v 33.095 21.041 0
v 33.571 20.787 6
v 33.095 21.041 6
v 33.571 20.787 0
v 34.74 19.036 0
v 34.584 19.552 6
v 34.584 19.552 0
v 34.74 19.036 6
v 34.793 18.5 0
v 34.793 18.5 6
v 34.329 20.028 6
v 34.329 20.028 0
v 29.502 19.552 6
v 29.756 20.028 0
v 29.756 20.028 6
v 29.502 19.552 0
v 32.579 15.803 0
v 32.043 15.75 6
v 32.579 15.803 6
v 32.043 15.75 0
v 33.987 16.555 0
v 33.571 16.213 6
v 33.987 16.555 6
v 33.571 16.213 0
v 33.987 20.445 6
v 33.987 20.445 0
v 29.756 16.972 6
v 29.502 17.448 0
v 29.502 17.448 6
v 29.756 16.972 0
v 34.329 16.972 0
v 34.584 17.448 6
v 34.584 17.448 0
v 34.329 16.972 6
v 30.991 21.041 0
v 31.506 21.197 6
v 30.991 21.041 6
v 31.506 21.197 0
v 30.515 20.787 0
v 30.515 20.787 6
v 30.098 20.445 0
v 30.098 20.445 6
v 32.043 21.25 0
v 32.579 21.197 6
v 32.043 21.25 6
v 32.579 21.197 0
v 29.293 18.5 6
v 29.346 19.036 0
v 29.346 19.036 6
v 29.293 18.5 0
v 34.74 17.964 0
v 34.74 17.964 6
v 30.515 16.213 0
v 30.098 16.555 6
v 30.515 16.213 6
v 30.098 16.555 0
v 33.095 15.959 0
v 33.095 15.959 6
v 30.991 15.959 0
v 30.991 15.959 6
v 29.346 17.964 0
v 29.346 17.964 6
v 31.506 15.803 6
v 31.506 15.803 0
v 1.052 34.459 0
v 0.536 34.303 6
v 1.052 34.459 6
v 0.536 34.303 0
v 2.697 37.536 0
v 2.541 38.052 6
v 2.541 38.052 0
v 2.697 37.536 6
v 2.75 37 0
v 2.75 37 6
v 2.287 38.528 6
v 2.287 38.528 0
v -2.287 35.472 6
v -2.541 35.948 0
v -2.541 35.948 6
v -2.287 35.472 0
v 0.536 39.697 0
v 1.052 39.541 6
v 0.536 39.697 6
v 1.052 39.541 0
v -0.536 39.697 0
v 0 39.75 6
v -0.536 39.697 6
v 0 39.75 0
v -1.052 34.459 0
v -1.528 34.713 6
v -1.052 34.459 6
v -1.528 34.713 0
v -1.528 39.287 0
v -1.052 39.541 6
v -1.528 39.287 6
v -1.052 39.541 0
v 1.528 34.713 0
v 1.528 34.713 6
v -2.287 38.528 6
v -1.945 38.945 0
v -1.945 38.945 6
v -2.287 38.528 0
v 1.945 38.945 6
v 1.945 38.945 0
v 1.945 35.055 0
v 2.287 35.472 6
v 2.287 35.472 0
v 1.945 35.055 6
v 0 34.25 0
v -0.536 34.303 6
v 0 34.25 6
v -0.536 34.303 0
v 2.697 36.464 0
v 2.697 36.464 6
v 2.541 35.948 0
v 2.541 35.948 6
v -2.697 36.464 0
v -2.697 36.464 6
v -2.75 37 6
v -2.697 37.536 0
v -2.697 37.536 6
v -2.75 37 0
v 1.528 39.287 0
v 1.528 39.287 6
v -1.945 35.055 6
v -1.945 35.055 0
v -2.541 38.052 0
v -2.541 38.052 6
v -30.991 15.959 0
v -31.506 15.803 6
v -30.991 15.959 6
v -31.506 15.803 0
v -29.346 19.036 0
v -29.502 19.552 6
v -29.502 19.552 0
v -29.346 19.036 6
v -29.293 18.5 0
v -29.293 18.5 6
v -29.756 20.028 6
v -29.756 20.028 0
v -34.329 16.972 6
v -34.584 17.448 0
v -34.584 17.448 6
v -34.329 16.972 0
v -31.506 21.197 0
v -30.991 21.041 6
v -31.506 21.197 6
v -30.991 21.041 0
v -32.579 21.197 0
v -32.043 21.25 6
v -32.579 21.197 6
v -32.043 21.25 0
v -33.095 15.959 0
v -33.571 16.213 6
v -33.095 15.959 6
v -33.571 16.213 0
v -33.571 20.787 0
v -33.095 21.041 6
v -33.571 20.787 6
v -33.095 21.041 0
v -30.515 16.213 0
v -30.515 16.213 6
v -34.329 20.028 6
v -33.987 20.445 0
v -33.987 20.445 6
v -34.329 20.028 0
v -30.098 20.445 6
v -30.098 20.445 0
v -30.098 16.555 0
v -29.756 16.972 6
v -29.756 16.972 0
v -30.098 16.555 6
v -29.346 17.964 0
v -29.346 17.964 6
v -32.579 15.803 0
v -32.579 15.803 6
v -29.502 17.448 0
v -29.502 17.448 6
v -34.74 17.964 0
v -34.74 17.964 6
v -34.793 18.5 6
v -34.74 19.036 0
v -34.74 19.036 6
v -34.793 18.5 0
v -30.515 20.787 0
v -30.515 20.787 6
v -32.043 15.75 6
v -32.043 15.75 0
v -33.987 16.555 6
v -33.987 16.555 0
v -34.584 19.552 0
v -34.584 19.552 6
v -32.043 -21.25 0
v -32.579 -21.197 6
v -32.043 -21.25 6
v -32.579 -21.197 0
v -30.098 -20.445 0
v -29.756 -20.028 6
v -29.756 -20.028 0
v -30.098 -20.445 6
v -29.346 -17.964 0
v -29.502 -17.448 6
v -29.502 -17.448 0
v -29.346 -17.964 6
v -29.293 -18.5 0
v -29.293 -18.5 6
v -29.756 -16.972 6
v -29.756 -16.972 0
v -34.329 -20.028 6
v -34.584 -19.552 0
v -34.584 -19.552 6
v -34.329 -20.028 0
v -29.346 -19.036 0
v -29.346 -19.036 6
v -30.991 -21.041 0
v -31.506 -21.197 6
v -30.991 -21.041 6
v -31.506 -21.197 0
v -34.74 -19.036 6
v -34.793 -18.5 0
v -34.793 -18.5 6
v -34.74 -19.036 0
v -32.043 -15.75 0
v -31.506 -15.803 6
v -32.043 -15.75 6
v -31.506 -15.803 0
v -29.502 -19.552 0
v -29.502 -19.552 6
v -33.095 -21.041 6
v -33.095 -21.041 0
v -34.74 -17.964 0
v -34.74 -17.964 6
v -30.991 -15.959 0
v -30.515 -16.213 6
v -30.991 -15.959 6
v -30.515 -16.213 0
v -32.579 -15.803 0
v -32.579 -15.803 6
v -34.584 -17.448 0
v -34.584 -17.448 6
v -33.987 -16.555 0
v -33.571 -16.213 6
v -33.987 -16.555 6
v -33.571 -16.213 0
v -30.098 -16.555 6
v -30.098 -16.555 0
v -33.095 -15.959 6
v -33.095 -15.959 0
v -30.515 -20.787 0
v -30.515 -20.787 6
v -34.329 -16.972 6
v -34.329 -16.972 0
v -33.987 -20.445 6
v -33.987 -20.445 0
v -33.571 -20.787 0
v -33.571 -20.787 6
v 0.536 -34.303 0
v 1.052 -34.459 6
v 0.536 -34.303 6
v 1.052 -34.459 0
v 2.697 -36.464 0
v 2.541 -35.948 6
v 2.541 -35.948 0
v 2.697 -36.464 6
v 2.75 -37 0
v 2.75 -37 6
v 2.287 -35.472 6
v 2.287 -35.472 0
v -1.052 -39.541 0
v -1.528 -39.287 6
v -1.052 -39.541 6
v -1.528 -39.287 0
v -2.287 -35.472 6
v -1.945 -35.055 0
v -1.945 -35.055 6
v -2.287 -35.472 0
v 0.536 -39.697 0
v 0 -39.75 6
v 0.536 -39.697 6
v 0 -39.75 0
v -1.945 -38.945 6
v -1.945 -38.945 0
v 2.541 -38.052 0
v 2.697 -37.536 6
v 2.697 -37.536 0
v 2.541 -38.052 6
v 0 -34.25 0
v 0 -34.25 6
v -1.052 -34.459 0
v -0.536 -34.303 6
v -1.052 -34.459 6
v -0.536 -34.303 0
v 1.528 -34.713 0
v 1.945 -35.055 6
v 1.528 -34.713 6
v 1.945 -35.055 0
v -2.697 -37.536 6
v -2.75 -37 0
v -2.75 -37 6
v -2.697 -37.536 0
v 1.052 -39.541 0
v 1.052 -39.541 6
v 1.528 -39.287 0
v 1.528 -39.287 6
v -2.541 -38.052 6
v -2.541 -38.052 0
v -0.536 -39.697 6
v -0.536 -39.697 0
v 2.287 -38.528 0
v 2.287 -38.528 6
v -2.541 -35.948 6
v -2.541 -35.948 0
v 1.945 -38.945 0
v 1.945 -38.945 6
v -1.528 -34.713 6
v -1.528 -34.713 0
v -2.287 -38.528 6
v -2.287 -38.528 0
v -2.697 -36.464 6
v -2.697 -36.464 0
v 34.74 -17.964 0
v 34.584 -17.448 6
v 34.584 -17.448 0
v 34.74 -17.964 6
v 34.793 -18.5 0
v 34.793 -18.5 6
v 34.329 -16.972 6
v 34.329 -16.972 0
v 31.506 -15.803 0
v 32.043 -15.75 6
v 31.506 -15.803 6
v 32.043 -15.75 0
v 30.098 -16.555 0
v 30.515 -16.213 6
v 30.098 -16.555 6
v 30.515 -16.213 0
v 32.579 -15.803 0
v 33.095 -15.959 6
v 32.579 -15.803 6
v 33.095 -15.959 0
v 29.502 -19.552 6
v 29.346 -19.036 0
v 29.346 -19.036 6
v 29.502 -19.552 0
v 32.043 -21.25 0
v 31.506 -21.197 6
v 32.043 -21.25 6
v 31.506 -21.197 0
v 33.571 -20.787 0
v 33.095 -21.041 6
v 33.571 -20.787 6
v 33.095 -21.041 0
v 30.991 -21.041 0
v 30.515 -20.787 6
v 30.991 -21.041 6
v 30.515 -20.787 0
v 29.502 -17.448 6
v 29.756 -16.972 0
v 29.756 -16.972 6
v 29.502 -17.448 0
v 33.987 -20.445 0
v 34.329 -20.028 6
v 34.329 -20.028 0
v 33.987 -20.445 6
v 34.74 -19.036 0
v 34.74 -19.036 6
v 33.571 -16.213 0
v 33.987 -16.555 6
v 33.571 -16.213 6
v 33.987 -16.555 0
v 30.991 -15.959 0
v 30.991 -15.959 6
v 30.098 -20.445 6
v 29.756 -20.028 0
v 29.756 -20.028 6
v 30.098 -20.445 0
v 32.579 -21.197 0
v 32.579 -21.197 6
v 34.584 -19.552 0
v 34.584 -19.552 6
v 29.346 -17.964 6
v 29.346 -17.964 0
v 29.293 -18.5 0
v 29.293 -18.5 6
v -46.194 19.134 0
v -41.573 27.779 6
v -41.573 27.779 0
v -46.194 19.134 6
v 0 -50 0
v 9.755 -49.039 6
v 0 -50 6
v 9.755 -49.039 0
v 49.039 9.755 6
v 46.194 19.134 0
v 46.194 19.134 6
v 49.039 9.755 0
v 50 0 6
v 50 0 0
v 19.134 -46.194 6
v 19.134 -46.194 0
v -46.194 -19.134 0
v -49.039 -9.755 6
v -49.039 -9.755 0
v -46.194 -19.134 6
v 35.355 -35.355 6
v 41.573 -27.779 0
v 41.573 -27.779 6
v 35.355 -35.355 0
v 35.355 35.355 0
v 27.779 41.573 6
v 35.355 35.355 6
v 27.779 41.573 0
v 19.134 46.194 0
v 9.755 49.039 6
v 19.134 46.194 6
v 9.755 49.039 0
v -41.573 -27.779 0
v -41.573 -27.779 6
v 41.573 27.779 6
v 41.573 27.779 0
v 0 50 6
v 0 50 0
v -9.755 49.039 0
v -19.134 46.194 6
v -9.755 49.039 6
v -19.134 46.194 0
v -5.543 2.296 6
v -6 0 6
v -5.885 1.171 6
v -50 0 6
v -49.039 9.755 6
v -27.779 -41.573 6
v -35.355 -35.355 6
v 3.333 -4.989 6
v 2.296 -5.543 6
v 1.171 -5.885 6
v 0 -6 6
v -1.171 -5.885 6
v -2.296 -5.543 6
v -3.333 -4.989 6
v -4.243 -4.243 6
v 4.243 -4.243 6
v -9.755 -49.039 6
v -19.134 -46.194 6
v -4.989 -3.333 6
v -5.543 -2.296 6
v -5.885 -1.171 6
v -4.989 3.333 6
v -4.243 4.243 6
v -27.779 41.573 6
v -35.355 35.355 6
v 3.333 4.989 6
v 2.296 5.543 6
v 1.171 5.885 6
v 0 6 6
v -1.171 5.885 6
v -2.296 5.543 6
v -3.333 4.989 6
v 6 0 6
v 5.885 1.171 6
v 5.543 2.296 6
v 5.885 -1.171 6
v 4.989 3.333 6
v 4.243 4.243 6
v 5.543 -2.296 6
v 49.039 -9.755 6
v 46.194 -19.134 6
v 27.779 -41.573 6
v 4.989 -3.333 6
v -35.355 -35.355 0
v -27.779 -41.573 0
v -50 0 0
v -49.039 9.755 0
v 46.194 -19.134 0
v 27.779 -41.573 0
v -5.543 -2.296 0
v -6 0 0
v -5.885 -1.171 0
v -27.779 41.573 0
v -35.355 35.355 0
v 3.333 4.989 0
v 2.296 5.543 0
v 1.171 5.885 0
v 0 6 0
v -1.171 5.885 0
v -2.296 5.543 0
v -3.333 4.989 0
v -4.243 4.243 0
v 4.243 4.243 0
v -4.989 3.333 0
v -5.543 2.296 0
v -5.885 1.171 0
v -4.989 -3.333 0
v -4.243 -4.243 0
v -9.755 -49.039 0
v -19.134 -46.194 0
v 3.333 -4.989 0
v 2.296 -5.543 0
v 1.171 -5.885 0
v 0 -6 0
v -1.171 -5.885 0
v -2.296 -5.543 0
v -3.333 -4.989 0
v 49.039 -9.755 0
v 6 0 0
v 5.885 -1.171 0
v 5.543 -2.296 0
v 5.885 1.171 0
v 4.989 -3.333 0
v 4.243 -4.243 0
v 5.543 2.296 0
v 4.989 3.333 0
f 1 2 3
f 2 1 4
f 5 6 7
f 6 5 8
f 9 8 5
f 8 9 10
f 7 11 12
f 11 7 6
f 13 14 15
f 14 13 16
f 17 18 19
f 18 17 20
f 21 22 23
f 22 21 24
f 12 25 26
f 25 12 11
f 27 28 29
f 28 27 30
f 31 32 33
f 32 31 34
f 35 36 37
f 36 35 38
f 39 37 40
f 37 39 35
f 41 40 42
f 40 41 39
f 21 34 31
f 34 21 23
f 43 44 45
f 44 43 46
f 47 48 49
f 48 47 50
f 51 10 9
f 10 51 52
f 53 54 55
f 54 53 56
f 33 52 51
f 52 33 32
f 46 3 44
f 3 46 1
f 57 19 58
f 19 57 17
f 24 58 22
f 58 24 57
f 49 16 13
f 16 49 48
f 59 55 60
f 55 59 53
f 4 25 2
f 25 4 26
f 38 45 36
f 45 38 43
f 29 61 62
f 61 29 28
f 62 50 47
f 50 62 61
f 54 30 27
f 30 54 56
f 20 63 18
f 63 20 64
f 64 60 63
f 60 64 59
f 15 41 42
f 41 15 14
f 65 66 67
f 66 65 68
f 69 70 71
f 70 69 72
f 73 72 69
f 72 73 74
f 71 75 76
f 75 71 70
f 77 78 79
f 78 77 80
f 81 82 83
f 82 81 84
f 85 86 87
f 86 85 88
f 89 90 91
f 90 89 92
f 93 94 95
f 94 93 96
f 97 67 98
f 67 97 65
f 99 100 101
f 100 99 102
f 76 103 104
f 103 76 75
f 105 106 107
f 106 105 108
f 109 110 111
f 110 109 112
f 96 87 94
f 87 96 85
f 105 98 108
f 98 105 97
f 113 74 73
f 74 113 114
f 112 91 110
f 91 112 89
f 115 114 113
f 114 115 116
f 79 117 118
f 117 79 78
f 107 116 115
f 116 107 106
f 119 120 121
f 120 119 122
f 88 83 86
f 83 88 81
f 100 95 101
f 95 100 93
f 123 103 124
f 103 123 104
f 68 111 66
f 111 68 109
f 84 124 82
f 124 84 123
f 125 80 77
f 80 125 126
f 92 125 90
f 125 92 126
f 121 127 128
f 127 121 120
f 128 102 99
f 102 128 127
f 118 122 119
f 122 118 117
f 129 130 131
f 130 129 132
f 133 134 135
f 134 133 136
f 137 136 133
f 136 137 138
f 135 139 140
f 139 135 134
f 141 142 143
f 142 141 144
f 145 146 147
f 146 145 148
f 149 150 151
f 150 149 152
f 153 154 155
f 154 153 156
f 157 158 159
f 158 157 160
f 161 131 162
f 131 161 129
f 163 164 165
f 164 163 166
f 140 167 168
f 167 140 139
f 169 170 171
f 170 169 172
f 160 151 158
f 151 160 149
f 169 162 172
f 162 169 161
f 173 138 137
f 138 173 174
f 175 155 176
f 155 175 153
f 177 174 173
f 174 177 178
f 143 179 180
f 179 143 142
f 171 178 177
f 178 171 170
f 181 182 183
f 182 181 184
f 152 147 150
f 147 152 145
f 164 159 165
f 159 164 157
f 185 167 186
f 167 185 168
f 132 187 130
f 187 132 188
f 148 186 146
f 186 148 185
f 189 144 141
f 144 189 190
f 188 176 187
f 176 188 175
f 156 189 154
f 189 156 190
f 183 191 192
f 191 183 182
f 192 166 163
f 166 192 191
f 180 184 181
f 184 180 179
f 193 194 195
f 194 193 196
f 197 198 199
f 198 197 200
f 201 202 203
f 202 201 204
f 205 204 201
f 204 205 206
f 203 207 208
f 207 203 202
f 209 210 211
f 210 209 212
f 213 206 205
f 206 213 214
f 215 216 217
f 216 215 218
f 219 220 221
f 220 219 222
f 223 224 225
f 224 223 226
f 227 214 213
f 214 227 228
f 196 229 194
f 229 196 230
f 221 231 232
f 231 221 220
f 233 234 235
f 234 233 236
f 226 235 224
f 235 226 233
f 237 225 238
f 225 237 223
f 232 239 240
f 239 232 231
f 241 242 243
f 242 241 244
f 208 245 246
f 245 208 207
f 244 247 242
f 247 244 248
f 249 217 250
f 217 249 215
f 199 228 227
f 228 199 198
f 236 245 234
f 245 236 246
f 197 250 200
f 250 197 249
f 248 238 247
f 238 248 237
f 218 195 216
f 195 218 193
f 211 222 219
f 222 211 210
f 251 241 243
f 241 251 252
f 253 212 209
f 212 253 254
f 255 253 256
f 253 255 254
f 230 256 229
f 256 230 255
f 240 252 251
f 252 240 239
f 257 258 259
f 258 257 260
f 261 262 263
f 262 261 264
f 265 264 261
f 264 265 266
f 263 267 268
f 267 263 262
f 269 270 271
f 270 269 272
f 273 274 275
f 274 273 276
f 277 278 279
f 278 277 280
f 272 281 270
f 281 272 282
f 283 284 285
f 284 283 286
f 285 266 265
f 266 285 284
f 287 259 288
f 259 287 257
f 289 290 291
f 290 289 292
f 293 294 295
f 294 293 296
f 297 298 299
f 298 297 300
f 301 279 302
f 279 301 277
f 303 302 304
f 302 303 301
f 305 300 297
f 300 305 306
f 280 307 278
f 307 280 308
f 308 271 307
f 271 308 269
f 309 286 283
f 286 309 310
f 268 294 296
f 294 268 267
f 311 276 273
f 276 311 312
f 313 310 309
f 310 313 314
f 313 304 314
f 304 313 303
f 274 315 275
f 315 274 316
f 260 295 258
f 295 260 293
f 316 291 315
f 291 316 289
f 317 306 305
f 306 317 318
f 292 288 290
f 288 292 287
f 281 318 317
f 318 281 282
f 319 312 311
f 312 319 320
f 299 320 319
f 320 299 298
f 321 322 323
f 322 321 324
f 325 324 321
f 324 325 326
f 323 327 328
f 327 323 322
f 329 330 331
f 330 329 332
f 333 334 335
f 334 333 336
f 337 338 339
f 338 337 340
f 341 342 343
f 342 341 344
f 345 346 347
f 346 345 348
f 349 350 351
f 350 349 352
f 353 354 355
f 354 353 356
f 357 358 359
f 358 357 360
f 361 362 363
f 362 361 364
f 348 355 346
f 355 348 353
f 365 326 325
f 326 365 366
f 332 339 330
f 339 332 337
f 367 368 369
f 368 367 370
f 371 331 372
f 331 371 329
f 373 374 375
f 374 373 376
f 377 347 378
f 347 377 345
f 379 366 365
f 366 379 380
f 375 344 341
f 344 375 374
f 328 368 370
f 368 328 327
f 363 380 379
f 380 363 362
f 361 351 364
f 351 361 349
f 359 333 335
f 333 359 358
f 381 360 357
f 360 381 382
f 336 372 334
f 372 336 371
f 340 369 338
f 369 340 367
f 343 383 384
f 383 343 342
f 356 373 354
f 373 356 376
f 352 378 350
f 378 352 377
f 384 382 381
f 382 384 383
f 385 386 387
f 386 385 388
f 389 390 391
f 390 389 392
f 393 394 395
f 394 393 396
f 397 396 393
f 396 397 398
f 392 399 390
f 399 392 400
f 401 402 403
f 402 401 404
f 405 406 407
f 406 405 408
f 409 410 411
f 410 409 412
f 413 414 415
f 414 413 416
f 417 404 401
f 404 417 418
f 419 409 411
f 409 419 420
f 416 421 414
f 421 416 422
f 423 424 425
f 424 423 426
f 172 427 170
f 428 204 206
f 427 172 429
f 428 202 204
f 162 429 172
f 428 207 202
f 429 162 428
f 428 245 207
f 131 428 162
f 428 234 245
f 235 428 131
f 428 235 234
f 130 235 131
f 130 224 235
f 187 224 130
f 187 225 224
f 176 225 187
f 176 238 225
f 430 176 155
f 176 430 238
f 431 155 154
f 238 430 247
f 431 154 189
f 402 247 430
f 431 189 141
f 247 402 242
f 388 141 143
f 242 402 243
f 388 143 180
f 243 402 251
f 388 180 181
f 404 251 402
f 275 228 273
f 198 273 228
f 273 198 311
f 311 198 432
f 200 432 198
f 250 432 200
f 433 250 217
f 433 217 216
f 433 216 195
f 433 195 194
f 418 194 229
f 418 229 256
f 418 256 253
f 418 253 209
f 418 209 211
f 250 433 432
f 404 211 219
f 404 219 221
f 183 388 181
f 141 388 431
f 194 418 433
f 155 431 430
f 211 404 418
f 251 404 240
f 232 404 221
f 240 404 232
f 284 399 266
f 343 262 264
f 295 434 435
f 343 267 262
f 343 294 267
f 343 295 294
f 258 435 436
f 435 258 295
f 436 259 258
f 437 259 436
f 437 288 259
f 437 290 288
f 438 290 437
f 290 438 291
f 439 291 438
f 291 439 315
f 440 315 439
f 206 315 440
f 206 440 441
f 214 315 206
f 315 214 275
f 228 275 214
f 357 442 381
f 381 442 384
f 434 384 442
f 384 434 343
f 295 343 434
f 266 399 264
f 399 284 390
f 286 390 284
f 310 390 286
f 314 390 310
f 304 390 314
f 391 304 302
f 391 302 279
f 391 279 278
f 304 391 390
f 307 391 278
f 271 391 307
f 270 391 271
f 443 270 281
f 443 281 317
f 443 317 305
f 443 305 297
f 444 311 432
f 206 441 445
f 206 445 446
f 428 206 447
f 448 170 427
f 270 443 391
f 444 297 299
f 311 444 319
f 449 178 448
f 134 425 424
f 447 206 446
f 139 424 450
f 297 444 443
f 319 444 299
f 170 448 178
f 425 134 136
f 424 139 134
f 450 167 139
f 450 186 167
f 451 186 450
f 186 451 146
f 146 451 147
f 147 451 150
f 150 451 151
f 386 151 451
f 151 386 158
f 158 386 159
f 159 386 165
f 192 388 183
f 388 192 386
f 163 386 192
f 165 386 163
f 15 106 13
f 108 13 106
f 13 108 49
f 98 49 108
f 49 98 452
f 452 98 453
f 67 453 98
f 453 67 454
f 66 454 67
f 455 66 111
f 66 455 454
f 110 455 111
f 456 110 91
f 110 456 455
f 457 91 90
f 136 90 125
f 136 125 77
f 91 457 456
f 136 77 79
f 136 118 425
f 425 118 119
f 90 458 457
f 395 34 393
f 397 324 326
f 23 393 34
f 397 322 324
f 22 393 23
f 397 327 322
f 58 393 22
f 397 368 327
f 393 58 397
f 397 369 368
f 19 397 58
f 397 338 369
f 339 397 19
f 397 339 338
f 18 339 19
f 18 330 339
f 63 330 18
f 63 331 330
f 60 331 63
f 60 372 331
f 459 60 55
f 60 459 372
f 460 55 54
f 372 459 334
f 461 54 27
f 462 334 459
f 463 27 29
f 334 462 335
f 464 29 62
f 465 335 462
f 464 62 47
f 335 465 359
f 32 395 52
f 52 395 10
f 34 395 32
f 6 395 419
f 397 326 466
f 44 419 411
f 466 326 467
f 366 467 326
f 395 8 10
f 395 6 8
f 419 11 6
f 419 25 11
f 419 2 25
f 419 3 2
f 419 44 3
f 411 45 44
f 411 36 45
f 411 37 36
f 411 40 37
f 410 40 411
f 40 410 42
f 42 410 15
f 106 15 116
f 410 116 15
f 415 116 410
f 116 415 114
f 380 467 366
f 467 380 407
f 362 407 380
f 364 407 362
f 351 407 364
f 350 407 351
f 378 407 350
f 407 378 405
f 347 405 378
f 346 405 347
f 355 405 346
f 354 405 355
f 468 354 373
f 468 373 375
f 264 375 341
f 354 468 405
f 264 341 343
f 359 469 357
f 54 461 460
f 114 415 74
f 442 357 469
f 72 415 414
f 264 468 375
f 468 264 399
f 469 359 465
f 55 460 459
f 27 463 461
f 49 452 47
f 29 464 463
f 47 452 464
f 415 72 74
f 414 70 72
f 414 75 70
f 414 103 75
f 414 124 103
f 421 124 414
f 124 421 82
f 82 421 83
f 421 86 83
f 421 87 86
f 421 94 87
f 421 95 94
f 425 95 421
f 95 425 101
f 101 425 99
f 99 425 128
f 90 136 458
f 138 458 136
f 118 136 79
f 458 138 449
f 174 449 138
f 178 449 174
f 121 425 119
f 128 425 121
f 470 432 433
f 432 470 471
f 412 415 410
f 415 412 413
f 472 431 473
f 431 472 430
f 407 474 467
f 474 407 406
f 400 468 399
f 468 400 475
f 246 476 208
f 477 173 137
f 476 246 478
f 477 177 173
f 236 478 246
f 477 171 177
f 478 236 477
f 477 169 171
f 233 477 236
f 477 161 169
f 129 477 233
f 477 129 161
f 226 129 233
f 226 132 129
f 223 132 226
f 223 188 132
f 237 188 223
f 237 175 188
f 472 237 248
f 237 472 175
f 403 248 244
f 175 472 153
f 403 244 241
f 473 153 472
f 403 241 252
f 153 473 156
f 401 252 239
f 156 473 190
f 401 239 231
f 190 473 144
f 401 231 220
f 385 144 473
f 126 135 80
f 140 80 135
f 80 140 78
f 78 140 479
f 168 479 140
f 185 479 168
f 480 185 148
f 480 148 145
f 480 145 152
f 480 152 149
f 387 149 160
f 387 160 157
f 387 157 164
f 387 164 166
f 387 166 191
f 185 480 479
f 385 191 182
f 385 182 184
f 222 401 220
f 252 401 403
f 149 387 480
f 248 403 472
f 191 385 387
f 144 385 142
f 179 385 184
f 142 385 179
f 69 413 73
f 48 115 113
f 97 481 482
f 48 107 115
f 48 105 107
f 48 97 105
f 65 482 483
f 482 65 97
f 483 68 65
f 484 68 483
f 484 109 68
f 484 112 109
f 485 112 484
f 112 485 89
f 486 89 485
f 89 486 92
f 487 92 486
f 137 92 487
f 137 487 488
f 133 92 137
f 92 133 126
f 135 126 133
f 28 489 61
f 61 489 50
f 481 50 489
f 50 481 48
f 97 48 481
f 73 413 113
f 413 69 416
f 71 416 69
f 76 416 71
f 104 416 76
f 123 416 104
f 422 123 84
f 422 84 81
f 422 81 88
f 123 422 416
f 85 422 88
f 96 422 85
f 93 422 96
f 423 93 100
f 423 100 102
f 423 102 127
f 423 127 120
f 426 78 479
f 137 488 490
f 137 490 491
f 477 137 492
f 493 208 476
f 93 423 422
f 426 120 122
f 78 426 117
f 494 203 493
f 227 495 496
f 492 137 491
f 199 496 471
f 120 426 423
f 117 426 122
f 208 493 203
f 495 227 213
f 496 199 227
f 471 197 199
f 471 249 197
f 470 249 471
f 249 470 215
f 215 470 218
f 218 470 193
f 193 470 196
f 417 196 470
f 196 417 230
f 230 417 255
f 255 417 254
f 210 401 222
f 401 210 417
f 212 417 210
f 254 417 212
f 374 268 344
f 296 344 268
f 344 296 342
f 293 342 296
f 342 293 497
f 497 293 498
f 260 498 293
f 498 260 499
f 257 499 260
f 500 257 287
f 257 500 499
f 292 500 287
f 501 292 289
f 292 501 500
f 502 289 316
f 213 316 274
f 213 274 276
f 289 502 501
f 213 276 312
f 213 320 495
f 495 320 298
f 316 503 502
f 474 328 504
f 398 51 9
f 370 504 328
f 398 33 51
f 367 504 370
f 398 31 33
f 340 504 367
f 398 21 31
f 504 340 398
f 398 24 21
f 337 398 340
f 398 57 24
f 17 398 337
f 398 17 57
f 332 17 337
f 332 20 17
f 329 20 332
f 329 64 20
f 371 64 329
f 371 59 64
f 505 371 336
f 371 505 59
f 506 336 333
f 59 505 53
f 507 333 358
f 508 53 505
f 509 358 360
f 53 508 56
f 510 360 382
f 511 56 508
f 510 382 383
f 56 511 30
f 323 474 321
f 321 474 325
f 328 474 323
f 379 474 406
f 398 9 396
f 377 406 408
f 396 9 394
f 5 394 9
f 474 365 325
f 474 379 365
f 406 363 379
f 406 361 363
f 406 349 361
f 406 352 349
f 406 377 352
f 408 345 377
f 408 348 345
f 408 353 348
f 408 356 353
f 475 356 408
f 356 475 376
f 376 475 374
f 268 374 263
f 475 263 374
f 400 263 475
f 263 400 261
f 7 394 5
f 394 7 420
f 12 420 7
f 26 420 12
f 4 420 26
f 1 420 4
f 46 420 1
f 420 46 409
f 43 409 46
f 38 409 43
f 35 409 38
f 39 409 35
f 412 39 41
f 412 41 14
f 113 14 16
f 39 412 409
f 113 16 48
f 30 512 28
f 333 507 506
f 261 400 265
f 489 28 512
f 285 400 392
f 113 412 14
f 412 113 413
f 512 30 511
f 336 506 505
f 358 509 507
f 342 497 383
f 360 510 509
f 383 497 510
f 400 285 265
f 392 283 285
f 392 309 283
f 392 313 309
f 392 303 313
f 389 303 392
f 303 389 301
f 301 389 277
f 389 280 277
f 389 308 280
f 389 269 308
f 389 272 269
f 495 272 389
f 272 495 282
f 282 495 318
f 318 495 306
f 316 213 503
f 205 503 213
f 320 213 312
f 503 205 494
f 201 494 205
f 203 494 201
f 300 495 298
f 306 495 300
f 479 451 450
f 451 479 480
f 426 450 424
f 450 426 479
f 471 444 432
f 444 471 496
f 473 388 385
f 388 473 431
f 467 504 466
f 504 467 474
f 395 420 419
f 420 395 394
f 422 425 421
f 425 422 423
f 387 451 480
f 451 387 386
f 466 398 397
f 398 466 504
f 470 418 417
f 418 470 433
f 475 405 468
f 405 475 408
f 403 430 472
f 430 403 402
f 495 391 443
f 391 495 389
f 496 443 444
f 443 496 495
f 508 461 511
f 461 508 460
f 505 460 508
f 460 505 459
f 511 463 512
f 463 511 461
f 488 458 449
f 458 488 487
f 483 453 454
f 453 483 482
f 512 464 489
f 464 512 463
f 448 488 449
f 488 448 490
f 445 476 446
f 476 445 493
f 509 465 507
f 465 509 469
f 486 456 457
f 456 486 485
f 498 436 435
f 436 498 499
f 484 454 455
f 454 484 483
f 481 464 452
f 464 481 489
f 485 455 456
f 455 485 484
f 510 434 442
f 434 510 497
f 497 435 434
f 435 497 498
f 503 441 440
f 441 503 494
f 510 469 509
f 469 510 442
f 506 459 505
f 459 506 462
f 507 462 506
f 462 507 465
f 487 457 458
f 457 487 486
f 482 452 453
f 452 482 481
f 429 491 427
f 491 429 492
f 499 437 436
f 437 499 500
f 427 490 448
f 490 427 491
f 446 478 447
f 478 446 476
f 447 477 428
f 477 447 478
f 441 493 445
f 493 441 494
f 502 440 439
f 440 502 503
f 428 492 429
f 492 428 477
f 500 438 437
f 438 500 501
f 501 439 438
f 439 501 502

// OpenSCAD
$fn = 32;

// ----------------------------------------------------------------------
// Flange Ø100 x 6
// 6 holes on a Ø74 bolt circle, bolted joints
// ----------------------------------------------------------------------

// --- parameters (mm) ---
flange_d = 100;  // outside diameter of the flange
thickness = 6;   // flange thickness
holes = 6;       // number of bolt holes
pcd = 74;        // bolt circle diameter
start_deg = 30;  // angle of the first hole, from +X
hole_d = 5.5;    // bolt hole diameter
bore_d = 12;     // central through bore
hub_d = 20;      // hub outside diameter
hub_h = 0;       // hub height above the flange face (0 = no hub)

// --- derived feature positions (mm) ---
height = thickness + hub_h;  // = 6   overall height of the part
pcd_r = pcd / 2;             // = 37   bolt circle radius
hole_step = 360 / holes;     // = 60   angular pitch
feature_centers = [
  [pcd_r * cos(start_deg + 0 * hole_step), pcd_r * sin(start_deg + 0 * hole_step)],
  [pcd_r * cos(start_deg + 1 * hole_step), pcd_r * sin(start_deg + 1 * hole_step)],
  [pcd_r * cos(start_deg + 2 * hole_step), pcd_r * sin(start_deg + 2 * hole_step)],
  [pcd_r * cos(start_deg + 3 * hole_step), pcd_r * sin(start_deg + 3 * hole_step)],
  [pcd_r * cos(start_deg + 4 * hole_step), pcd_r * sin(start_deg + 4 * hole_step)],
  [pcd_r * cos(start_deg + 5 * hole_step), pcd_r * sin(start_deg + 5 * hole_step)]
];   // bolt hole centres on the pitch circle

// flange disc, every hole and the bore cut straight through
difference() {
  union() {
    cylinder(d = flange_d, h = thickness);
  }
  translate([0, 0, -1]) cylinder(d = bore_d, h = height + 2);  // bore, through
  for (centre = feature_centers)
    translate([centre[0], centre[1], -1]) cylinder(d = hole_d, h = thickness + 2);
}
